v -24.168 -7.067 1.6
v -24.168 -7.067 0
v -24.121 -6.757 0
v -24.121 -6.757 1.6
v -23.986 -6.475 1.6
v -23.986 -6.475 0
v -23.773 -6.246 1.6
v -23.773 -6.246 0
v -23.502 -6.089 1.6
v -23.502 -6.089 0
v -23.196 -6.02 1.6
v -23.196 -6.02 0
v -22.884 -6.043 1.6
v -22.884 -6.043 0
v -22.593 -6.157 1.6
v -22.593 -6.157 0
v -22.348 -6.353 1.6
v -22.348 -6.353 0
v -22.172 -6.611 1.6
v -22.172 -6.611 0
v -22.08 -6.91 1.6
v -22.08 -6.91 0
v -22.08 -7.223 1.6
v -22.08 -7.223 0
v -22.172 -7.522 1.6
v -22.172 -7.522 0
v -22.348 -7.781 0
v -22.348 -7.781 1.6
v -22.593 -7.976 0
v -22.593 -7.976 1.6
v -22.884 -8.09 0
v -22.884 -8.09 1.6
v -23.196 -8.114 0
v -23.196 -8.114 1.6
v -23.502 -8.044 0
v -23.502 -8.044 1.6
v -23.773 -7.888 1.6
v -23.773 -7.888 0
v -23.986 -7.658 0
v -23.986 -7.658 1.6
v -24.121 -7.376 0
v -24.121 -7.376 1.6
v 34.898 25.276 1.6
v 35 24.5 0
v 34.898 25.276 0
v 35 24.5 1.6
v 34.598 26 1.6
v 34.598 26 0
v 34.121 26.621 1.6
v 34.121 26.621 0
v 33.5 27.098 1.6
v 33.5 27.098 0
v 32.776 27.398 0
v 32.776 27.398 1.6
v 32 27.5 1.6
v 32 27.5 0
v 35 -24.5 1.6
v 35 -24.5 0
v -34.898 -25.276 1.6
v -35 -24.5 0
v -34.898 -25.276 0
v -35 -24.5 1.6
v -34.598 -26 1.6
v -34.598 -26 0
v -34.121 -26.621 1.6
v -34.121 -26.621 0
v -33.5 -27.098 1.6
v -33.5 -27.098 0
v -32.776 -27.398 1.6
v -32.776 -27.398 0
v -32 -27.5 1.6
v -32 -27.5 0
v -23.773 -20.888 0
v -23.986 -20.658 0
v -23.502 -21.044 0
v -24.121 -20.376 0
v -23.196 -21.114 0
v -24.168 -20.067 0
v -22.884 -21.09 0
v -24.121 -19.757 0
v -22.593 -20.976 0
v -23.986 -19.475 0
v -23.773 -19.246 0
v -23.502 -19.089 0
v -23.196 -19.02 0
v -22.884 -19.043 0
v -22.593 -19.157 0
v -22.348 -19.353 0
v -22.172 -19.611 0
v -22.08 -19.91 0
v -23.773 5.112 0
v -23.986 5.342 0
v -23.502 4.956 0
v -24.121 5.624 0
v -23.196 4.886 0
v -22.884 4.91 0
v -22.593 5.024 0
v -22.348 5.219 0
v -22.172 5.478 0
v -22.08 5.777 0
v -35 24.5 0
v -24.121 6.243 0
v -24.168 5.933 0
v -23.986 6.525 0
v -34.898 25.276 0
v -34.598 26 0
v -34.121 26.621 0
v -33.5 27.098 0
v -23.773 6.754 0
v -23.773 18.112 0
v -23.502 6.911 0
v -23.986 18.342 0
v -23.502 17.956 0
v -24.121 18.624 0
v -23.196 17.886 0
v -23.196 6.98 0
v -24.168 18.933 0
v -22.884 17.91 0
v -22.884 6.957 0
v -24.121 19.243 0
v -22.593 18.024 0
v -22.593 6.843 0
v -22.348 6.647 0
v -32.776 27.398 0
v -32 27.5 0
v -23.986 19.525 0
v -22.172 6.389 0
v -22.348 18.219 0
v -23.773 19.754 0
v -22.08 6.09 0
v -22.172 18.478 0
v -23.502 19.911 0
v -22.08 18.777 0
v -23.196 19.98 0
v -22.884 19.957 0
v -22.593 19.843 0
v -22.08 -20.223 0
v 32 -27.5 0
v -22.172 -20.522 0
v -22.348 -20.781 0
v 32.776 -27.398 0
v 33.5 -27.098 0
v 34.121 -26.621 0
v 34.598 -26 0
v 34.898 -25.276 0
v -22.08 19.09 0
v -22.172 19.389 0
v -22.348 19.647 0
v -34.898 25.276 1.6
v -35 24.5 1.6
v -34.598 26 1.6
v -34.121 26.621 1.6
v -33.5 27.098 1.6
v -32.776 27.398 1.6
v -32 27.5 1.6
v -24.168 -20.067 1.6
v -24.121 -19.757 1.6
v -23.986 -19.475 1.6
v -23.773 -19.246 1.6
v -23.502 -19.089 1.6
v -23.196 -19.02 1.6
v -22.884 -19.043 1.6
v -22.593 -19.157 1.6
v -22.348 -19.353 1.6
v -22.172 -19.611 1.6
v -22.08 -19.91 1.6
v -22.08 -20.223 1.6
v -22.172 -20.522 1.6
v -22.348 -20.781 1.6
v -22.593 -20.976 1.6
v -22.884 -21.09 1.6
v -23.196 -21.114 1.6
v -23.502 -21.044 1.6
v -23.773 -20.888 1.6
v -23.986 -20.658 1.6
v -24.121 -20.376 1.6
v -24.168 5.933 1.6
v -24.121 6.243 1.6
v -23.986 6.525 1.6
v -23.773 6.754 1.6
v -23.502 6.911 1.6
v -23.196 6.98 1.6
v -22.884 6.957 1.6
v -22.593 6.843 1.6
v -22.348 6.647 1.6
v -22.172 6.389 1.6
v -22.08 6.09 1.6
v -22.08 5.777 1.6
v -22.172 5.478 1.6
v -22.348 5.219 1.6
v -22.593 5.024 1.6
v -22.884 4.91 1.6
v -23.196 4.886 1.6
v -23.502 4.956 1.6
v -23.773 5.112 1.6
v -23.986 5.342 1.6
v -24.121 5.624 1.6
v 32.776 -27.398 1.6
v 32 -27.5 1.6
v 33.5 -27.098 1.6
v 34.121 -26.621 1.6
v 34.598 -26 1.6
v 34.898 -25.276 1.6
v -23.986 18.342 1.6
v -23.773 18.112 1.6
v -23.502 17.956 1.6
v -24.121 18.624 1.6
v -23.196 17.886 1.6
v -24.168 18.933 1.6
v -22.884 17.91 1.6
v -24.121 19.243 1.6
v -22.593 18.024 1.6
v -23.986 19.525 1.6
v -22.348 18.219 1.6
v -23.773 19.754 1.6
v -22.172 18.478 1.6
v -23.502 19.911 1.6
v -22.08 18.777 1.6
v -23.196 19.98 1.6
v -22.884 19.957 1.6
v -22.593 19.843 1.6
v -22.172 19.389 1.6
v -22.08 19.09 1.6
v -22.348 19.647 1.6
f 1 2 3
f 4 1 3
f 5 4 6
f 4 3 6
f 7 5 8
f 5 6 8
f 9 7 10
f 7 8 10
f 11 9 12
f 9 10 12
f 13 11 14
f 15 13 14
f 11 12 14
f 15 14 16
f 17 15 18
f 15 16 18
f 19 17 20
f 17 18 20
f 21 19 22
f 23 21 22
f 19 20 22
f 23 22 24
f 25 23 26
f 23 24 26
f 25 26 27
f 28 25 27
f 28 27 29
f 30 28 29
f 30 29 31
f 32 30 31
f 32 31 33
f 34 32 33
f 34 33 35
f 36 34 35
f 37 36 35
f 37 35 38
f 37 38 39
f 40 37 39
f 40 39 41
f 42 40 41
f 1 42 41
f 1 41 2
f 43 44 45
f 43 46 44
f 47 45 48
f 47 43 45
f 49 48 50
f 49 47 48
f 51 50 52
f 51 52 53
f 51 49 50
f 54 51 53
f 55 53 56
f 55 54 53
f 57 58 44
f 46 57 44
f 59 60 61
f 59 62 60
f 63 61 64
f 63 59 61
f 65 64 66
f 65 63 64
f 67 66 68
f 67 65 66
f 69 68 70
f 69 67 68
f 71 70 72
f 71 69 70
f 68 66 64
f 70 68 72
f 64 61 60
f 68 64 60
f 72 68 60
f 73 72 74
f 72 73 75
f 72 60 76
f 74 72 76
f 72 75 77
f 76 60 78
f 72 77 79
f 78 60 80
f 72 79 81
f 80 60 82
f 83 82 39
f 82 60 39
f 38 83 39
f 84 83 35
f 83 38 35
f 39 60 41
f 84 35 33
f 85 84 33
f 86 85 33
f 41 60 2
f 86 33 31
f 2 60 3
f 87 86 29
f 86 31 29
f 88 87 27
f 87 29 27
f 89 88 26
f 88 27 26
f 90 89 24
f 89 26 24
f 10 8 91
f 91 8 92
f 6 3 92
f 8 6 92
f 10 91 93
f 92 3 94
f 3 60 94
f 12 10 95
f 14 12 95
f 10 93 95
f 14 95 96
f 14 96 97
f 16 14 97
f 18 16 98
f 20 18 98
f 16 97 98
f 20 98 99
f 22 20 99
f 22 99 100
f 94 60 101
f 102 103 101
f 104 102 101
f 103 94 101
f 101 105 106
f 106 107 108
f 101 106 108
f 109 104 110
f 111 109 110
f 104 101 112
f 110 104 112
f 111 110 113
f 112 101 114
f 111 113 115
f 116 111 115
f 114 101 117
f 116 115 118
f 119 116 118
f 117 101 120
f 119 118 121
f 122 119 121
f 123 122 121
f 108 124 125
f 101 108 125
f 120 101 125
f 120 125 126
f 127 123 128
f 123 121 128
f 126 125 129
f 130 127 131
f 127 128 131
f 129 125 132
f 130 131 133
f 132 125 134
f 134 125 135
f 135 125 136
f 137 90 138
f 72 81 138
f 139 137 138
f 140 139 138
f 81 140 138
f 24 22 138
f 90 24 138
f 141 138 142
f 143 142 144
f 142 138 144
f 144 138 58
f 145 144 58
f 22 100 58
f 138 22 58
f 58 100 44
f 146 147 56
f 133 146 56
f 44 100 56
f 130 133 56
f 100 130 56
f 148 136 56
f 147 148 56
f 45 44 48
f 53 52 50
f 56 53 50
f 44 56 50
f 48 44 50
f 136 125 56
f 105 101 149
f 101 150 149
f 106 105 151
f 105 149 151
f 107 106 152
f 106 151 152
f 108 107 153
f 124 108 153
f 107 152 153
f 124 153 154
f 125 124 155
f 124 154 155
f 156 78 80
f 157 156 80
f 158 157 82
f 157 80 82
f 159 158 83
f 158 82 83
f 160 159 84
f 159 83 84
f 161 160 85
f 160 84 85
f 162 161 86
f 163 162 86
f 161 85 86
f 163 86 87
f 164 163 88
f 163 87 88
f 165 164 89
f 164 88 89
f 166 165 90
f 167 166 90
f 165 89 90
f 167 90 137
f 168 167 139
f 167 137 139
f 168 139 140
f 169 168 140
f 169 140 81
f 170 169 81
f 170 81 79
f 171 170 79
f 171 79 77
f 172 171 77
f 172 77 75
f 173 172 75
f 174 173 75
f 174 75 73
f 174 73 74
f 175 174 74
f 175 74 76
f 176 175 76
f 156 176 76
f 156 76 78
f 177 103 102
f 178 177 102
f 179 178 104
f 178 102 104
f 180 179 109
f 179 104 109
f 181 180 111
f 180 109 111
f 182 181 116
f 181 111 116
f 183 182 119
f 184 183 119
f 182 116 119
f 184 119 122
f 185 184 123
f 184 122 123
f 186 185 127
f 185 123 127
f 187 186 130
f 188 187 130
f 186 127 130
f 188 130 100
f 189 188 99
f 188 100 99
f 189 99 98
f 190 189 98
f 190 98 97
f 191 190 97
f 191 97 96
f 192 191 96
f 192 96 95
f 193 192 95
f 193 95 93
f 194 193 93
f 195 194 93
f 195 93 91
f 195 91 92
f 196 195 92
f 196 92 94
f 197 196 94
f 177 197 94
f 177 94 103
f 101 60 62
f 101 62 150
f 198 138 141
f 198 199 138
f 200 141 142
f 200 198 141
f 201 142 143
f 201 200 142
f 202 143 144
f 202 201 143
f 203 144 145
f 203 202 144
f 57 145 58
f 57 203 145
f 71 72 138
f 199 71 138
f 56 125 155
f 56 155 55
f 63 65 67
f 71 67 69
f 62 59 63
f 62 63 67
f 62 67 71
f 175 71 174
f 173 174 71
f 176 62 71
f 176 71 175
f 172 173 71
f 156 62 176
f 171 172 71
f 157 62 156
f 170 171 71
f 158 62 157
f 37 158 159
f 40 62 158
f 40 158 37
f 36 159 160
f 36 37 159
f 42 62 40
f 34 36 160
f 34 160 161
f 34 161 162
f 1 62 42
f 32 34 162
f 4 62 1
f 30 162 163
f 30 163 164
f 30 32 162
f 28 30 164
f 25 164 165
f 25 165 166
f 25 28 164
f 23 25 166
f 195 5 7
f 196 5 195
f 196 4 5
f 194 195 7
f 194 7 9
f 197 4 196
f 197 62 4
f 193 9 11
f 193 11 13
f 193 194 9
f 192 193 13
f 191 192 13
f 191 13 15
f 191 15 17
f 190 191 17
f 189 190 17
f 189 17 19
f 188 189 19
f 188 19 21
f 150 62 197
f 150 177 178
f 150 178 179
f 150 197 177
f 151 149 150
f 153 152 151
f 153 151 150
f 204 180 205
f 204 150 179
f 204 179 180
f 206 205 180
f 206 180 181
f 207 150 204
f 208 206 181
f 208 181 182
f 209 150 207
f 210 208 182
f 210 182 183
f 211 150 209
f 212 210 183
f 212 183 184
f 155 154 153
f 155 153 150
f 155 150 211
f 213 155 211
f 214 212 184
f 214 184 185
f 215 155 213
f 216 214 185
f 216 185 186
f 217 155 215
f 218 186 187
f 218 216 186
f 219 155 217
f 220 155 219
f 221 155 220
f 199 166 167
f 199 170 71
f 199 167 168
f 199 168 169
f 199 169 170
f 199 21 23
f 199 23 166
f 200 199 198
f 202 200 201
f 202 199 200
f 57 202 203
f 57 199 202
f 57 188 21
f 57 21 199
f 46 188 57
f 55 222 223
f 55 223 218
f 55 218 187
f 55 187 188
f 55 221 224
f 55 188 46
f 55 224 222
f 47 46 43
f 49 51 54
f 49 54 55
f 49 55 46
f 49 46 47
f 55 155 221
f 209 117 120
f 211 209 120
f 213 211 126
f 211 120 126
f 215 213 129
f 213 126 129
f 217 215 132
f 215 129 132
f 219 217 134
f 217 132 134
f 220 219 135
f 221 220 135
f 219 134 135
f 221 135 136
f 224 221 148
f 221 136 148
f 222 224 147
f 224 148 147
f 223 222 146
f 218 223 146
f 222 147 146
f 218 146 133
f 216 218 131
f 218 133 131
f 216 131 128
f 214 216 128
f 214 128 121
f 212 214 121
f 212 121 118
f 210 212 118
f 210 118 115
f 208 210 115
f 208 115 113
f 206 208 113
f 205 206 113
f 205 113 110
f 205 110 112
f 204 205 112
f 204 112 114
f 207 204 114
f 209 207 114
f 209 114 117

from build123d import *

# Parameters (mm, degrees)
ESQUISSE1_W        = 70
ESQUISSE1_H        = 55
BOSS_EXTRU_1_DEPTH = 1.6
CONG_1_R           = 3
SKETCH1_R          = 1.05
CUT_EXTRUDE1_DEPTH = 2.6


with BuildPart() as part:
    # Esquisse1 → Boss.-Extru.1 (new body)
    with BuildSketch(Plane.XY):
        Rectangle(ESQUISSE1_W, ESQUISSE1_H)
    extrude(amount=BOSS_EXTRU_1_DEPTH)

    # Congé1
    cong_1_edges = [part.edges().sort_by_distance(p)[0] for p in [
        (35, -27.5, 0.8),
        (-35, -27.5, 0.8),
        (-35, 27.5, 0.8),
        (35, 27.5, 0.8),
    ]]
    fillet(cong_1_edges, radius=CONG_1_R)

    # Sketch1 → Cut-Extrude1 (cut, through all)
    with BuildSketch(Plane(origin=(0, 0, 0), x_dir=(-1, 0, 0), z_dir=(0, 0, -1))):
        with Locations((23.118003478, -20.06669)):
            Circle(SKETCH1_R)
        with Locations((23.118003478, -7.06669)):
            Circle(SKETCH1_R)
        with Locations((23.118003478, 5.93331)):
            Circle(SKETCH1_R)
        with Locations((23.118003478, 18.93331)):
            Circle(SKETCH1_R)
    extrude(amount=-CUT_EXTRUDE1_DEPTH, mode=Mode.SUBTRACT)


solid = part.part
